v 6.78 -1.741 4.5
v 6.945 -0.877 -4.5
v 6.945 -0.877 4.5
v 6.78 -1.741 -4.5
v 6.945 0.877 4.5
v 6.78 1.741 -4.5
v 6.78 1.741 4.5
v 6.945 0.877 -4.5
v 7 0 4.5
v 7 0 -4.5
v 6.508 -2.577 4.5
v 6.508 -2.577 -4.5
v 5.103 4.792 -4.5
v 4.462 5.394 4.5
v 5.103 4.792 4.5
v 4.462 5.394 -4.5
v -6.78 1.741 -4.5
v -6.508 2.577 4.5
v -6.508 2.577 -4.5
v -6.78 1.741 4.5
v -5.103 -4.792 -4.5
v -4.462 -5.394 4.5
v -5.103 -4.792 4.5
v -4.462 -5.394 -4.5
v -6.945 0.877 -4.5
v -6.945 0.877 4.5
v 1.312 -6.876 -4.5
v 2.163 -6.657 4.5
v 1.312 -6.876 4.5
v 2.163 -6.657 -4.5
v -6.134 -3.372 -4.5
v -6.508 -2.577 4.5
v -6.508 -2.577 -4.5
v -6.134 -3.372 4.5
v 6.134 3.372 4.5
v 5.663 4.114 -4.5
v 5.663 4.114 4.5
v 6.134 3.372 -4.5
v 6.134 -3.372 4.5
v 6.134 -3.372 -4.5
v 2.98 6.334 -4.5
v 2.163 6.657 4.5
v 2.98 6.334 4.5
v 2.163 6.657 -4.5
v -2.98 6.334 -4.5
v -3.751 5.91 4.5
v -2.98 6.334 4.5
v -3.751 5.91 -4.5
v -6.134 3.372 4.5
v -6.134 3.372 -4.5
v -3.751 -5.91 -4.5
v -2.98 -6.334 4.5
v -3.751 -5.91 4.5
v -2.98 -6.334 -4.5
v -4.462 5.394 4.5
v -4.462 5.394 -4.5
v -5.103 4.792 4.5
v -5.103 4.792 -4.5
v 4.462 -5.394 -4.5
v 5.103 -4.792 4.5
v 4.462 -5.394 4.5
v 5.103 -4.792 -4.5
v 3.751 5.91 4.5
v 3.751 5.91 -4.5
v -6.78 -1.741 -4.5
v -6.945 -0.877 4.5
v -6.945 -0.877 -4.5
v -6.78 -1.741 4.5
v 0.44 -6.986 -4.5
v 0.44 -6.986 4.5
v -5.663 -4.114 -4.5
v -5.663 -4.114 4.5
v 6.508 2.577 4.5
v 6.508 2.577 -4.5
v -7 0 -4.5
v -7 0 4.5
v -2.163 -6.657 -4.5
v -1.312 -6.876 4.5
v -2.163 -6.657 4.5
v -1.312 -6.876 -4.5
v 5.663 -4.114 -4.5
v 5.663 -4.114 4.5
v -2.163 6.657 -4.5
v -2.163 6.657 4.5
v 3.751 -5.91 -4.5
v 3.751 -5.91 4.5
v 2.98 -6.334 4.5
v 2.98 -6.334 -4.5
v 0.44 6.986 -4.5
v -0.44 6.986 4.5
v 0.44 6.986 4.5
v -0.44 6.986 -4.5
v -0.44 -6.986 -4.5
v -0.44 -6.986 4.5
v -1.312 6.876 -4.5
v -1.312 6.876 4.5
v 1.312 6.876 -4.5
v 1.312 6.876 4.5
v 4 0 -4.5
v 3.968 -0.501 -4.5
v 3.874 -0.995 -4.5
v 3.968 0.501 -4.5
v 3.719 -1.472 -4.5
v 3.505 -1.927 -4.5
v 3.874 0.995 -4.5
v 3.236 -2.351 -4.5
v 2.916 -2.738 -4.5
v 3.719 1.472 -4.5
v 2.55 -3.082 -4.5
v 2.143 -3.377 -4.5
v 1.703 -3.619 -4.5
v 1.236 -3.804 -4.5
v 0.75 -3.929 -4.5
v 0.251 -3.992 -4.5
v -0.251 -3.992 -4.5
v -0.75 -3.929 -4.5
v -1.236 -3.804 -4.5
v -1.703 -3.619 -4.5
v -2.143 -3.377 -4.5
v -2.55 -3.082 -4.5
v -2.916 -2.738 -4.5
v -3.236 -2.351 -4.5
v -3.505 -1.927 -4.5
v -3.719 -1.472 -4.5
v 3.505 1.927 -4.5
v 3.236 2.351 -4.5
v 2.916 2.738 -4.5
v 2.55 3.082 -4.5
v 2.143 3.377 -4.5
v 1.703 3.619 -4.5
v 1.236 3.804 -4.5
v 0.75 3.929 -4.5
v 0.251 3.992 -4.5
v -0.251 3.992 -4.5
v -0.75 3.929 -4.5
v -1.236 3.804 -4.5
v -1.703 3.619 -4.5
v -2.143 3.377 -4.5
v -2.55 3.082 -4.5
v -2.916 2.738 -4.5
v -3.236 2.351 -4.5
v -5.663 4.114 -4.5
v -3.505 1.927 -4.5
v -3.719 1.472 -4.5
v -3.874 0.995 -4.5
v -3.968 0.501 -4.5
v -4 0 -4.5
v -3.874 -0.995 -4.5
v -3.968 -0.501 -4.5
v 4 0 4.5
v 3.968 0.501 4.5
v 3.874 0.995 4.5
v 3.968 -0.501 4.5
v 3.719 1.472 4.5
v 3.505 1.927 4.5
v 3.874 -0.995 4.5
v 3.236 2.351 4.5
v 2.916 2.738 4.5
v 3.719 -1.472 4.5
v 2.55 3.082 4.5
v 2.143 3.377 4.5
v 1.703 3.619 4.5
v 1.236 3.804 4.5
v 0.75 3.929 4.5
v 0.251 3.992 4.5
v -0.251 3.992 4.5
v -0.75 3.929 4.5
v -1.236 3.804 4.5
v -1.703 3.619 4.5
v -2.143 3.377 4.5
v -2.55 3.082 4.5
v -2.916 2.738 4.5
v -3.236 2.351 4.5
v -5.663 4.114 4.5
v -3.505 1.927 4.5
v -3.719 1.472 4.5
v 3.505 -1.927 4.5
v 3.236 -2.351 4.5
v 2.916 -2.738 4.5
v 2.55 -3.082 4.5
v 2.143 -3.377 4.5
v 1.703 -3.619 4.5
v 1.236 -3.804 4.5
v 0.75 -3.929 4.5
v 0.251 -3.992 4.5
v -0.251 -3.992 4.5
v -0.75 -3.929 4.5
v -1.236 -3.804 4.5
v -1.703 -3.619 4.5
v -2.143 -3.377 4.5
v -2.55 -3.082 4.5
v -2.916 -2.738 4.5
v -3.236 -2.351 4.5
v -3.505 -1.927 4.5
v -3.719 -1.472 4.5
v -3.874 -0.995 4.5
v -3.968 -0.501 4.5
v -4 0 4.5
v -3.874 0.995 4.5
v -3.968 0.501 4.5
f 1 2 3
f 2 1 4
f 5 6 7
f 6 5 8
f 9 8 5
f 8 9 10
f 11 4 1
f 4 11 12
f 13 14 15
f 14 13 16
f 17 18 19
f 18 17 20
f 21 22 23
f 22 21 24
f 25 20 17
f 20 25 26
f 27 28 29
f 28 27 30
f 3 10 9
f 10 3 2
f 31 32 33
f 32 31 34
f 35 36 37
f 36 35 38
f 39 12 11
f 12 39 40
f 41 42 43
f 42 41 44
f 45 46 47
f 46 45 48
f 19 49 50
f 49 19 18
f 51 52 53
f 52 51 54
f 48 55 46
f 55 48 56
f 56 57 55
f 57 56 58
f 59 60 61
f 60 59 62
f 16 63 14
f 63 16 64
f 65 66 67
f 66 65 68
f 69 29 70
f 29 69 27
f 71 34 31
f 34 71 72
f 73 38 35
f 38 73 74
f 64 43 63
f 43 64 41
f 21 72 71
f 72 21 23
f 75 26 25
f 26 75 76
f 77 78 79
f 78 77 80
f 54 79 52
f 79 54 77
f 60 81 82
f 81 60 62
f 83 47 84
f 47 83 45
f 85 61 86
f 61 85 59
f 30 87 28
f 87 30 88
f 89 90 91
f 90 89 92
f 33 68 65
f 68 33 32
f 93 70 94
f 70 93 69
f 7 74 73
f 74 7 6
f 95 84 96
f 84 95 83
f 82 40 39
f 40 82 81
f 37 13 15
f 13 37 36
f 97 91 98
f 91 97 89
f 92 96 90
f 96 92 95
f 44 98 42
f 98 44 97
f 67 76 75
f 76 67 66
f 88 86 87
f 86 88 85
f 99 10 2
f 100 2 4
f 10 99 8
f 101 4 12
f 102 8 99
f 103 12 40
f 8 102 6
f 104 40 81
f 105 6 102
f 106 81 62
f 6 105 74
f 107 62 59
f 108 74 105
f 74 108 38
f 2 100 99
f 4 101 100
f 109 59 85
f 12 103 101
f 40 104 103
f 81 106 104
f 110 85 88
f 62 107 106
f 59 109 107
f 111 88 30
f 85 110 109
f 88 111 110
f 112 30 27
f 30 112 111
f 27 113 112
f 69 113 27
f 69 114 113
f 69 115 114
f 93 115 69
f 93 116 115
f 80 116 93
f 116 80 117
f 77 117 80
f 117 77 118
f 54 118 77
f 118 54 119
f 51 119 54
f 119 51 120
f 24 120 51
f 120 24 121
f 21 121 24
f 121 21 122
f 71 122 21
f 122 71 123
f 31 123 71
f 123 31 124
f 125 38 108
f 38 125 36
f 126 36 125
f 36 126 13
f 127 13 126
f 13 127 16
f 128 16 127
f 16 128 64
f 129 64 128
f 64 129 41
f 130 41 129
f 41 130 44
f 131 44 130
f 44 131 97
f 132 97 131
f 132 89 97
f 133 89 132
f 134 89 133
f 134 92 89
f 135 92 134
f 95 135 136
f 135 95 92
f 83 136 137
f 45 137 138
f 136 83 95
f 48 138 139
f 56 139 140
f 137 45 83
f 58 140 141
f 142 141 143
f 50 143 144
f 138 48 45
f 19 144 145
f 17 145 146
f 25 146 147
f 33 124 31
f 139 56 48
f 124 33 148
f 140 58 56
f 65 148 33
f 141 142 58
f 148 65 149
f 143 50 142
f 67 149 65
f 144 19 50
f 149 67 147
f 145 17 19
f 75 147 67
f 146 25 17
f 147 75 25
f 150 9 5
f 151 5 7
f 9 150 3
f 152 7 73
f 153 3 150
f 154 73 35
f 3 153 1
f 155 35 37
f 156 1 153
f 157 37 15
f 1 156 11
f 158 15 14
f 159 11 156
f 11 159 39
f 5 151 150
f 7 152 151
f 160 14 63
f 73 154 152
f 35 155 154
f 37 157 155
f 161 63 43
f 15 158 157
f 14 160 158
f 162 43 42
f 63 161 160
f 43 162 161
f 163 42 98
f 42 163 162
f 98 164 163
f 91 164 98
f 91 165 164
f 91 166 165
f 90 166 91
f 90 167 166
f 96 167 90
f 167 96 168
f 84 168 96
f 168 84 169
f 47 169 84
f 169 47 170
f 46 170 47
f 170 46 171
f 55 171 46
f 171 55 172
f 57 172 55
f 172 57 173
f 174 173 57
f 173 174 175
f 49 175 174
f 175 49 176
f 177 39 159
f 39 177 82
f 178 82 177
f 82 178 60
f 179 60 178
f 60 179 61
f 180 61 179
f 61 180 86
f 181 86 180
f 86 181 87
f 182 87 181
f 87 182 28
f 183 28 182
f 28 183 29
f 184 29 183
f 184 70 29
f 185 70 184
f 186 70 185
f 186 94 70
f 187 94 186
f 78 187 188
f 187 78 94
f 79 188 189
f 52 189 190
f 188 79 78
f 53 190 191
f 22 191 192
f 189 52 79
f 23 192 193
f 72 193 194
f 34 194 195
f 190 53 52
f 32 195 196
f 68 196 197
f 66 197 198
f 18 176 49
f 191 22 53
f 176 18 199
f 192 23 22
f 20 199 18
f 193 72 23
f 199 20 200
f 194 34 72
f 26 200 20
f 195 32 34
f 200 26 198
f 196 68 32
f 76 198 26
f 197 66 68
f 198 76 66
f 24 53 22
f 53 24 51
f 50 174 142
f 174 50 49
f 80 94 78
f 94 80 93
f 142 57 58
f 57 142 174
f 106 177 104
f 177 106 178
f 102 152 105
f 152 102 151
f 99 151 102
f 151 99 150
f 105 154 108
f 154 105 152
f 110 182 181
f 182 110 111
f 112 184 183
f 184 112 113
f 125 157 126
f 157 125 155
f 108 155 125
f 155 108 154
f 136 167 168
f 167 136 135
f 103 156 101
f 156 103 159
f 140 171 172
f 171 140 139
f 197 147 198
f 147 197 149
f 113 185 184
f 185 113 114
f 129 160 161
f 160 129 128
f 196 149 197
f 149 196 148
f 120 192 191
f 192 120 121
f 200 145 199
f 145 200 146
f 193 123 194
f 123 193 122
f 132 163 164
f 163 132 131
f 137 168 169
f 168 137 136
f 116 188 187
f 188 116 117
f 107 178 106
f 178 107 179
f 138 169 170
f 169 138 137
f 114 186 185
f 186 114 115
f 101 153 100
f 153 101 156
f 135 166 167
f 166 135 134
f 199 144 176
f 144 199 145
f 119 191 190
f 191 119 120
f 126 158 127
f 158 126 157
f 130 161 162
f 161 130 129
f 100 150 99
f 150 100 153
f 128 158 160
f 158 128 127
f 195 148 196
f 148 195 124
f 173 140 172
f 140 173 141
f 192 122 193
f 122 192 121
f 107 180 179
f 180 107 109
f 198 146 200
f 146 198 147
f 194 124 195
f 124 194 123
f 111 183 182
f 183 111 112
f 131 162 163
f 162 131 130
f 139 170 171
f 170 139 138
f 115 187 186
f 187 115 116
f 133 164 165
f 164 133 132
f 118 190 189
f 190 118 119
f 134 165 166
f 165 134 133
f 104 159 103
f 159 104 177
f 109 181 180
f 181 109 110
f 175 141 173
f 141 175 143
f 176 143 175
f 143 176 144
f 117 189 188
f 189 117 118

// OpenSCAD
$fn = 50;


difference() {
	union() {
		translate(v = [0, 0, -4.5000000000]) {
			cylinder(h = 9, r = 7.0000000000);
		}
	}
	union() {
		translate(v = [0, 0, -100.0000000000]) {
			cylinder(h = 200, r = 4.0000000000);
		}
	}
}
